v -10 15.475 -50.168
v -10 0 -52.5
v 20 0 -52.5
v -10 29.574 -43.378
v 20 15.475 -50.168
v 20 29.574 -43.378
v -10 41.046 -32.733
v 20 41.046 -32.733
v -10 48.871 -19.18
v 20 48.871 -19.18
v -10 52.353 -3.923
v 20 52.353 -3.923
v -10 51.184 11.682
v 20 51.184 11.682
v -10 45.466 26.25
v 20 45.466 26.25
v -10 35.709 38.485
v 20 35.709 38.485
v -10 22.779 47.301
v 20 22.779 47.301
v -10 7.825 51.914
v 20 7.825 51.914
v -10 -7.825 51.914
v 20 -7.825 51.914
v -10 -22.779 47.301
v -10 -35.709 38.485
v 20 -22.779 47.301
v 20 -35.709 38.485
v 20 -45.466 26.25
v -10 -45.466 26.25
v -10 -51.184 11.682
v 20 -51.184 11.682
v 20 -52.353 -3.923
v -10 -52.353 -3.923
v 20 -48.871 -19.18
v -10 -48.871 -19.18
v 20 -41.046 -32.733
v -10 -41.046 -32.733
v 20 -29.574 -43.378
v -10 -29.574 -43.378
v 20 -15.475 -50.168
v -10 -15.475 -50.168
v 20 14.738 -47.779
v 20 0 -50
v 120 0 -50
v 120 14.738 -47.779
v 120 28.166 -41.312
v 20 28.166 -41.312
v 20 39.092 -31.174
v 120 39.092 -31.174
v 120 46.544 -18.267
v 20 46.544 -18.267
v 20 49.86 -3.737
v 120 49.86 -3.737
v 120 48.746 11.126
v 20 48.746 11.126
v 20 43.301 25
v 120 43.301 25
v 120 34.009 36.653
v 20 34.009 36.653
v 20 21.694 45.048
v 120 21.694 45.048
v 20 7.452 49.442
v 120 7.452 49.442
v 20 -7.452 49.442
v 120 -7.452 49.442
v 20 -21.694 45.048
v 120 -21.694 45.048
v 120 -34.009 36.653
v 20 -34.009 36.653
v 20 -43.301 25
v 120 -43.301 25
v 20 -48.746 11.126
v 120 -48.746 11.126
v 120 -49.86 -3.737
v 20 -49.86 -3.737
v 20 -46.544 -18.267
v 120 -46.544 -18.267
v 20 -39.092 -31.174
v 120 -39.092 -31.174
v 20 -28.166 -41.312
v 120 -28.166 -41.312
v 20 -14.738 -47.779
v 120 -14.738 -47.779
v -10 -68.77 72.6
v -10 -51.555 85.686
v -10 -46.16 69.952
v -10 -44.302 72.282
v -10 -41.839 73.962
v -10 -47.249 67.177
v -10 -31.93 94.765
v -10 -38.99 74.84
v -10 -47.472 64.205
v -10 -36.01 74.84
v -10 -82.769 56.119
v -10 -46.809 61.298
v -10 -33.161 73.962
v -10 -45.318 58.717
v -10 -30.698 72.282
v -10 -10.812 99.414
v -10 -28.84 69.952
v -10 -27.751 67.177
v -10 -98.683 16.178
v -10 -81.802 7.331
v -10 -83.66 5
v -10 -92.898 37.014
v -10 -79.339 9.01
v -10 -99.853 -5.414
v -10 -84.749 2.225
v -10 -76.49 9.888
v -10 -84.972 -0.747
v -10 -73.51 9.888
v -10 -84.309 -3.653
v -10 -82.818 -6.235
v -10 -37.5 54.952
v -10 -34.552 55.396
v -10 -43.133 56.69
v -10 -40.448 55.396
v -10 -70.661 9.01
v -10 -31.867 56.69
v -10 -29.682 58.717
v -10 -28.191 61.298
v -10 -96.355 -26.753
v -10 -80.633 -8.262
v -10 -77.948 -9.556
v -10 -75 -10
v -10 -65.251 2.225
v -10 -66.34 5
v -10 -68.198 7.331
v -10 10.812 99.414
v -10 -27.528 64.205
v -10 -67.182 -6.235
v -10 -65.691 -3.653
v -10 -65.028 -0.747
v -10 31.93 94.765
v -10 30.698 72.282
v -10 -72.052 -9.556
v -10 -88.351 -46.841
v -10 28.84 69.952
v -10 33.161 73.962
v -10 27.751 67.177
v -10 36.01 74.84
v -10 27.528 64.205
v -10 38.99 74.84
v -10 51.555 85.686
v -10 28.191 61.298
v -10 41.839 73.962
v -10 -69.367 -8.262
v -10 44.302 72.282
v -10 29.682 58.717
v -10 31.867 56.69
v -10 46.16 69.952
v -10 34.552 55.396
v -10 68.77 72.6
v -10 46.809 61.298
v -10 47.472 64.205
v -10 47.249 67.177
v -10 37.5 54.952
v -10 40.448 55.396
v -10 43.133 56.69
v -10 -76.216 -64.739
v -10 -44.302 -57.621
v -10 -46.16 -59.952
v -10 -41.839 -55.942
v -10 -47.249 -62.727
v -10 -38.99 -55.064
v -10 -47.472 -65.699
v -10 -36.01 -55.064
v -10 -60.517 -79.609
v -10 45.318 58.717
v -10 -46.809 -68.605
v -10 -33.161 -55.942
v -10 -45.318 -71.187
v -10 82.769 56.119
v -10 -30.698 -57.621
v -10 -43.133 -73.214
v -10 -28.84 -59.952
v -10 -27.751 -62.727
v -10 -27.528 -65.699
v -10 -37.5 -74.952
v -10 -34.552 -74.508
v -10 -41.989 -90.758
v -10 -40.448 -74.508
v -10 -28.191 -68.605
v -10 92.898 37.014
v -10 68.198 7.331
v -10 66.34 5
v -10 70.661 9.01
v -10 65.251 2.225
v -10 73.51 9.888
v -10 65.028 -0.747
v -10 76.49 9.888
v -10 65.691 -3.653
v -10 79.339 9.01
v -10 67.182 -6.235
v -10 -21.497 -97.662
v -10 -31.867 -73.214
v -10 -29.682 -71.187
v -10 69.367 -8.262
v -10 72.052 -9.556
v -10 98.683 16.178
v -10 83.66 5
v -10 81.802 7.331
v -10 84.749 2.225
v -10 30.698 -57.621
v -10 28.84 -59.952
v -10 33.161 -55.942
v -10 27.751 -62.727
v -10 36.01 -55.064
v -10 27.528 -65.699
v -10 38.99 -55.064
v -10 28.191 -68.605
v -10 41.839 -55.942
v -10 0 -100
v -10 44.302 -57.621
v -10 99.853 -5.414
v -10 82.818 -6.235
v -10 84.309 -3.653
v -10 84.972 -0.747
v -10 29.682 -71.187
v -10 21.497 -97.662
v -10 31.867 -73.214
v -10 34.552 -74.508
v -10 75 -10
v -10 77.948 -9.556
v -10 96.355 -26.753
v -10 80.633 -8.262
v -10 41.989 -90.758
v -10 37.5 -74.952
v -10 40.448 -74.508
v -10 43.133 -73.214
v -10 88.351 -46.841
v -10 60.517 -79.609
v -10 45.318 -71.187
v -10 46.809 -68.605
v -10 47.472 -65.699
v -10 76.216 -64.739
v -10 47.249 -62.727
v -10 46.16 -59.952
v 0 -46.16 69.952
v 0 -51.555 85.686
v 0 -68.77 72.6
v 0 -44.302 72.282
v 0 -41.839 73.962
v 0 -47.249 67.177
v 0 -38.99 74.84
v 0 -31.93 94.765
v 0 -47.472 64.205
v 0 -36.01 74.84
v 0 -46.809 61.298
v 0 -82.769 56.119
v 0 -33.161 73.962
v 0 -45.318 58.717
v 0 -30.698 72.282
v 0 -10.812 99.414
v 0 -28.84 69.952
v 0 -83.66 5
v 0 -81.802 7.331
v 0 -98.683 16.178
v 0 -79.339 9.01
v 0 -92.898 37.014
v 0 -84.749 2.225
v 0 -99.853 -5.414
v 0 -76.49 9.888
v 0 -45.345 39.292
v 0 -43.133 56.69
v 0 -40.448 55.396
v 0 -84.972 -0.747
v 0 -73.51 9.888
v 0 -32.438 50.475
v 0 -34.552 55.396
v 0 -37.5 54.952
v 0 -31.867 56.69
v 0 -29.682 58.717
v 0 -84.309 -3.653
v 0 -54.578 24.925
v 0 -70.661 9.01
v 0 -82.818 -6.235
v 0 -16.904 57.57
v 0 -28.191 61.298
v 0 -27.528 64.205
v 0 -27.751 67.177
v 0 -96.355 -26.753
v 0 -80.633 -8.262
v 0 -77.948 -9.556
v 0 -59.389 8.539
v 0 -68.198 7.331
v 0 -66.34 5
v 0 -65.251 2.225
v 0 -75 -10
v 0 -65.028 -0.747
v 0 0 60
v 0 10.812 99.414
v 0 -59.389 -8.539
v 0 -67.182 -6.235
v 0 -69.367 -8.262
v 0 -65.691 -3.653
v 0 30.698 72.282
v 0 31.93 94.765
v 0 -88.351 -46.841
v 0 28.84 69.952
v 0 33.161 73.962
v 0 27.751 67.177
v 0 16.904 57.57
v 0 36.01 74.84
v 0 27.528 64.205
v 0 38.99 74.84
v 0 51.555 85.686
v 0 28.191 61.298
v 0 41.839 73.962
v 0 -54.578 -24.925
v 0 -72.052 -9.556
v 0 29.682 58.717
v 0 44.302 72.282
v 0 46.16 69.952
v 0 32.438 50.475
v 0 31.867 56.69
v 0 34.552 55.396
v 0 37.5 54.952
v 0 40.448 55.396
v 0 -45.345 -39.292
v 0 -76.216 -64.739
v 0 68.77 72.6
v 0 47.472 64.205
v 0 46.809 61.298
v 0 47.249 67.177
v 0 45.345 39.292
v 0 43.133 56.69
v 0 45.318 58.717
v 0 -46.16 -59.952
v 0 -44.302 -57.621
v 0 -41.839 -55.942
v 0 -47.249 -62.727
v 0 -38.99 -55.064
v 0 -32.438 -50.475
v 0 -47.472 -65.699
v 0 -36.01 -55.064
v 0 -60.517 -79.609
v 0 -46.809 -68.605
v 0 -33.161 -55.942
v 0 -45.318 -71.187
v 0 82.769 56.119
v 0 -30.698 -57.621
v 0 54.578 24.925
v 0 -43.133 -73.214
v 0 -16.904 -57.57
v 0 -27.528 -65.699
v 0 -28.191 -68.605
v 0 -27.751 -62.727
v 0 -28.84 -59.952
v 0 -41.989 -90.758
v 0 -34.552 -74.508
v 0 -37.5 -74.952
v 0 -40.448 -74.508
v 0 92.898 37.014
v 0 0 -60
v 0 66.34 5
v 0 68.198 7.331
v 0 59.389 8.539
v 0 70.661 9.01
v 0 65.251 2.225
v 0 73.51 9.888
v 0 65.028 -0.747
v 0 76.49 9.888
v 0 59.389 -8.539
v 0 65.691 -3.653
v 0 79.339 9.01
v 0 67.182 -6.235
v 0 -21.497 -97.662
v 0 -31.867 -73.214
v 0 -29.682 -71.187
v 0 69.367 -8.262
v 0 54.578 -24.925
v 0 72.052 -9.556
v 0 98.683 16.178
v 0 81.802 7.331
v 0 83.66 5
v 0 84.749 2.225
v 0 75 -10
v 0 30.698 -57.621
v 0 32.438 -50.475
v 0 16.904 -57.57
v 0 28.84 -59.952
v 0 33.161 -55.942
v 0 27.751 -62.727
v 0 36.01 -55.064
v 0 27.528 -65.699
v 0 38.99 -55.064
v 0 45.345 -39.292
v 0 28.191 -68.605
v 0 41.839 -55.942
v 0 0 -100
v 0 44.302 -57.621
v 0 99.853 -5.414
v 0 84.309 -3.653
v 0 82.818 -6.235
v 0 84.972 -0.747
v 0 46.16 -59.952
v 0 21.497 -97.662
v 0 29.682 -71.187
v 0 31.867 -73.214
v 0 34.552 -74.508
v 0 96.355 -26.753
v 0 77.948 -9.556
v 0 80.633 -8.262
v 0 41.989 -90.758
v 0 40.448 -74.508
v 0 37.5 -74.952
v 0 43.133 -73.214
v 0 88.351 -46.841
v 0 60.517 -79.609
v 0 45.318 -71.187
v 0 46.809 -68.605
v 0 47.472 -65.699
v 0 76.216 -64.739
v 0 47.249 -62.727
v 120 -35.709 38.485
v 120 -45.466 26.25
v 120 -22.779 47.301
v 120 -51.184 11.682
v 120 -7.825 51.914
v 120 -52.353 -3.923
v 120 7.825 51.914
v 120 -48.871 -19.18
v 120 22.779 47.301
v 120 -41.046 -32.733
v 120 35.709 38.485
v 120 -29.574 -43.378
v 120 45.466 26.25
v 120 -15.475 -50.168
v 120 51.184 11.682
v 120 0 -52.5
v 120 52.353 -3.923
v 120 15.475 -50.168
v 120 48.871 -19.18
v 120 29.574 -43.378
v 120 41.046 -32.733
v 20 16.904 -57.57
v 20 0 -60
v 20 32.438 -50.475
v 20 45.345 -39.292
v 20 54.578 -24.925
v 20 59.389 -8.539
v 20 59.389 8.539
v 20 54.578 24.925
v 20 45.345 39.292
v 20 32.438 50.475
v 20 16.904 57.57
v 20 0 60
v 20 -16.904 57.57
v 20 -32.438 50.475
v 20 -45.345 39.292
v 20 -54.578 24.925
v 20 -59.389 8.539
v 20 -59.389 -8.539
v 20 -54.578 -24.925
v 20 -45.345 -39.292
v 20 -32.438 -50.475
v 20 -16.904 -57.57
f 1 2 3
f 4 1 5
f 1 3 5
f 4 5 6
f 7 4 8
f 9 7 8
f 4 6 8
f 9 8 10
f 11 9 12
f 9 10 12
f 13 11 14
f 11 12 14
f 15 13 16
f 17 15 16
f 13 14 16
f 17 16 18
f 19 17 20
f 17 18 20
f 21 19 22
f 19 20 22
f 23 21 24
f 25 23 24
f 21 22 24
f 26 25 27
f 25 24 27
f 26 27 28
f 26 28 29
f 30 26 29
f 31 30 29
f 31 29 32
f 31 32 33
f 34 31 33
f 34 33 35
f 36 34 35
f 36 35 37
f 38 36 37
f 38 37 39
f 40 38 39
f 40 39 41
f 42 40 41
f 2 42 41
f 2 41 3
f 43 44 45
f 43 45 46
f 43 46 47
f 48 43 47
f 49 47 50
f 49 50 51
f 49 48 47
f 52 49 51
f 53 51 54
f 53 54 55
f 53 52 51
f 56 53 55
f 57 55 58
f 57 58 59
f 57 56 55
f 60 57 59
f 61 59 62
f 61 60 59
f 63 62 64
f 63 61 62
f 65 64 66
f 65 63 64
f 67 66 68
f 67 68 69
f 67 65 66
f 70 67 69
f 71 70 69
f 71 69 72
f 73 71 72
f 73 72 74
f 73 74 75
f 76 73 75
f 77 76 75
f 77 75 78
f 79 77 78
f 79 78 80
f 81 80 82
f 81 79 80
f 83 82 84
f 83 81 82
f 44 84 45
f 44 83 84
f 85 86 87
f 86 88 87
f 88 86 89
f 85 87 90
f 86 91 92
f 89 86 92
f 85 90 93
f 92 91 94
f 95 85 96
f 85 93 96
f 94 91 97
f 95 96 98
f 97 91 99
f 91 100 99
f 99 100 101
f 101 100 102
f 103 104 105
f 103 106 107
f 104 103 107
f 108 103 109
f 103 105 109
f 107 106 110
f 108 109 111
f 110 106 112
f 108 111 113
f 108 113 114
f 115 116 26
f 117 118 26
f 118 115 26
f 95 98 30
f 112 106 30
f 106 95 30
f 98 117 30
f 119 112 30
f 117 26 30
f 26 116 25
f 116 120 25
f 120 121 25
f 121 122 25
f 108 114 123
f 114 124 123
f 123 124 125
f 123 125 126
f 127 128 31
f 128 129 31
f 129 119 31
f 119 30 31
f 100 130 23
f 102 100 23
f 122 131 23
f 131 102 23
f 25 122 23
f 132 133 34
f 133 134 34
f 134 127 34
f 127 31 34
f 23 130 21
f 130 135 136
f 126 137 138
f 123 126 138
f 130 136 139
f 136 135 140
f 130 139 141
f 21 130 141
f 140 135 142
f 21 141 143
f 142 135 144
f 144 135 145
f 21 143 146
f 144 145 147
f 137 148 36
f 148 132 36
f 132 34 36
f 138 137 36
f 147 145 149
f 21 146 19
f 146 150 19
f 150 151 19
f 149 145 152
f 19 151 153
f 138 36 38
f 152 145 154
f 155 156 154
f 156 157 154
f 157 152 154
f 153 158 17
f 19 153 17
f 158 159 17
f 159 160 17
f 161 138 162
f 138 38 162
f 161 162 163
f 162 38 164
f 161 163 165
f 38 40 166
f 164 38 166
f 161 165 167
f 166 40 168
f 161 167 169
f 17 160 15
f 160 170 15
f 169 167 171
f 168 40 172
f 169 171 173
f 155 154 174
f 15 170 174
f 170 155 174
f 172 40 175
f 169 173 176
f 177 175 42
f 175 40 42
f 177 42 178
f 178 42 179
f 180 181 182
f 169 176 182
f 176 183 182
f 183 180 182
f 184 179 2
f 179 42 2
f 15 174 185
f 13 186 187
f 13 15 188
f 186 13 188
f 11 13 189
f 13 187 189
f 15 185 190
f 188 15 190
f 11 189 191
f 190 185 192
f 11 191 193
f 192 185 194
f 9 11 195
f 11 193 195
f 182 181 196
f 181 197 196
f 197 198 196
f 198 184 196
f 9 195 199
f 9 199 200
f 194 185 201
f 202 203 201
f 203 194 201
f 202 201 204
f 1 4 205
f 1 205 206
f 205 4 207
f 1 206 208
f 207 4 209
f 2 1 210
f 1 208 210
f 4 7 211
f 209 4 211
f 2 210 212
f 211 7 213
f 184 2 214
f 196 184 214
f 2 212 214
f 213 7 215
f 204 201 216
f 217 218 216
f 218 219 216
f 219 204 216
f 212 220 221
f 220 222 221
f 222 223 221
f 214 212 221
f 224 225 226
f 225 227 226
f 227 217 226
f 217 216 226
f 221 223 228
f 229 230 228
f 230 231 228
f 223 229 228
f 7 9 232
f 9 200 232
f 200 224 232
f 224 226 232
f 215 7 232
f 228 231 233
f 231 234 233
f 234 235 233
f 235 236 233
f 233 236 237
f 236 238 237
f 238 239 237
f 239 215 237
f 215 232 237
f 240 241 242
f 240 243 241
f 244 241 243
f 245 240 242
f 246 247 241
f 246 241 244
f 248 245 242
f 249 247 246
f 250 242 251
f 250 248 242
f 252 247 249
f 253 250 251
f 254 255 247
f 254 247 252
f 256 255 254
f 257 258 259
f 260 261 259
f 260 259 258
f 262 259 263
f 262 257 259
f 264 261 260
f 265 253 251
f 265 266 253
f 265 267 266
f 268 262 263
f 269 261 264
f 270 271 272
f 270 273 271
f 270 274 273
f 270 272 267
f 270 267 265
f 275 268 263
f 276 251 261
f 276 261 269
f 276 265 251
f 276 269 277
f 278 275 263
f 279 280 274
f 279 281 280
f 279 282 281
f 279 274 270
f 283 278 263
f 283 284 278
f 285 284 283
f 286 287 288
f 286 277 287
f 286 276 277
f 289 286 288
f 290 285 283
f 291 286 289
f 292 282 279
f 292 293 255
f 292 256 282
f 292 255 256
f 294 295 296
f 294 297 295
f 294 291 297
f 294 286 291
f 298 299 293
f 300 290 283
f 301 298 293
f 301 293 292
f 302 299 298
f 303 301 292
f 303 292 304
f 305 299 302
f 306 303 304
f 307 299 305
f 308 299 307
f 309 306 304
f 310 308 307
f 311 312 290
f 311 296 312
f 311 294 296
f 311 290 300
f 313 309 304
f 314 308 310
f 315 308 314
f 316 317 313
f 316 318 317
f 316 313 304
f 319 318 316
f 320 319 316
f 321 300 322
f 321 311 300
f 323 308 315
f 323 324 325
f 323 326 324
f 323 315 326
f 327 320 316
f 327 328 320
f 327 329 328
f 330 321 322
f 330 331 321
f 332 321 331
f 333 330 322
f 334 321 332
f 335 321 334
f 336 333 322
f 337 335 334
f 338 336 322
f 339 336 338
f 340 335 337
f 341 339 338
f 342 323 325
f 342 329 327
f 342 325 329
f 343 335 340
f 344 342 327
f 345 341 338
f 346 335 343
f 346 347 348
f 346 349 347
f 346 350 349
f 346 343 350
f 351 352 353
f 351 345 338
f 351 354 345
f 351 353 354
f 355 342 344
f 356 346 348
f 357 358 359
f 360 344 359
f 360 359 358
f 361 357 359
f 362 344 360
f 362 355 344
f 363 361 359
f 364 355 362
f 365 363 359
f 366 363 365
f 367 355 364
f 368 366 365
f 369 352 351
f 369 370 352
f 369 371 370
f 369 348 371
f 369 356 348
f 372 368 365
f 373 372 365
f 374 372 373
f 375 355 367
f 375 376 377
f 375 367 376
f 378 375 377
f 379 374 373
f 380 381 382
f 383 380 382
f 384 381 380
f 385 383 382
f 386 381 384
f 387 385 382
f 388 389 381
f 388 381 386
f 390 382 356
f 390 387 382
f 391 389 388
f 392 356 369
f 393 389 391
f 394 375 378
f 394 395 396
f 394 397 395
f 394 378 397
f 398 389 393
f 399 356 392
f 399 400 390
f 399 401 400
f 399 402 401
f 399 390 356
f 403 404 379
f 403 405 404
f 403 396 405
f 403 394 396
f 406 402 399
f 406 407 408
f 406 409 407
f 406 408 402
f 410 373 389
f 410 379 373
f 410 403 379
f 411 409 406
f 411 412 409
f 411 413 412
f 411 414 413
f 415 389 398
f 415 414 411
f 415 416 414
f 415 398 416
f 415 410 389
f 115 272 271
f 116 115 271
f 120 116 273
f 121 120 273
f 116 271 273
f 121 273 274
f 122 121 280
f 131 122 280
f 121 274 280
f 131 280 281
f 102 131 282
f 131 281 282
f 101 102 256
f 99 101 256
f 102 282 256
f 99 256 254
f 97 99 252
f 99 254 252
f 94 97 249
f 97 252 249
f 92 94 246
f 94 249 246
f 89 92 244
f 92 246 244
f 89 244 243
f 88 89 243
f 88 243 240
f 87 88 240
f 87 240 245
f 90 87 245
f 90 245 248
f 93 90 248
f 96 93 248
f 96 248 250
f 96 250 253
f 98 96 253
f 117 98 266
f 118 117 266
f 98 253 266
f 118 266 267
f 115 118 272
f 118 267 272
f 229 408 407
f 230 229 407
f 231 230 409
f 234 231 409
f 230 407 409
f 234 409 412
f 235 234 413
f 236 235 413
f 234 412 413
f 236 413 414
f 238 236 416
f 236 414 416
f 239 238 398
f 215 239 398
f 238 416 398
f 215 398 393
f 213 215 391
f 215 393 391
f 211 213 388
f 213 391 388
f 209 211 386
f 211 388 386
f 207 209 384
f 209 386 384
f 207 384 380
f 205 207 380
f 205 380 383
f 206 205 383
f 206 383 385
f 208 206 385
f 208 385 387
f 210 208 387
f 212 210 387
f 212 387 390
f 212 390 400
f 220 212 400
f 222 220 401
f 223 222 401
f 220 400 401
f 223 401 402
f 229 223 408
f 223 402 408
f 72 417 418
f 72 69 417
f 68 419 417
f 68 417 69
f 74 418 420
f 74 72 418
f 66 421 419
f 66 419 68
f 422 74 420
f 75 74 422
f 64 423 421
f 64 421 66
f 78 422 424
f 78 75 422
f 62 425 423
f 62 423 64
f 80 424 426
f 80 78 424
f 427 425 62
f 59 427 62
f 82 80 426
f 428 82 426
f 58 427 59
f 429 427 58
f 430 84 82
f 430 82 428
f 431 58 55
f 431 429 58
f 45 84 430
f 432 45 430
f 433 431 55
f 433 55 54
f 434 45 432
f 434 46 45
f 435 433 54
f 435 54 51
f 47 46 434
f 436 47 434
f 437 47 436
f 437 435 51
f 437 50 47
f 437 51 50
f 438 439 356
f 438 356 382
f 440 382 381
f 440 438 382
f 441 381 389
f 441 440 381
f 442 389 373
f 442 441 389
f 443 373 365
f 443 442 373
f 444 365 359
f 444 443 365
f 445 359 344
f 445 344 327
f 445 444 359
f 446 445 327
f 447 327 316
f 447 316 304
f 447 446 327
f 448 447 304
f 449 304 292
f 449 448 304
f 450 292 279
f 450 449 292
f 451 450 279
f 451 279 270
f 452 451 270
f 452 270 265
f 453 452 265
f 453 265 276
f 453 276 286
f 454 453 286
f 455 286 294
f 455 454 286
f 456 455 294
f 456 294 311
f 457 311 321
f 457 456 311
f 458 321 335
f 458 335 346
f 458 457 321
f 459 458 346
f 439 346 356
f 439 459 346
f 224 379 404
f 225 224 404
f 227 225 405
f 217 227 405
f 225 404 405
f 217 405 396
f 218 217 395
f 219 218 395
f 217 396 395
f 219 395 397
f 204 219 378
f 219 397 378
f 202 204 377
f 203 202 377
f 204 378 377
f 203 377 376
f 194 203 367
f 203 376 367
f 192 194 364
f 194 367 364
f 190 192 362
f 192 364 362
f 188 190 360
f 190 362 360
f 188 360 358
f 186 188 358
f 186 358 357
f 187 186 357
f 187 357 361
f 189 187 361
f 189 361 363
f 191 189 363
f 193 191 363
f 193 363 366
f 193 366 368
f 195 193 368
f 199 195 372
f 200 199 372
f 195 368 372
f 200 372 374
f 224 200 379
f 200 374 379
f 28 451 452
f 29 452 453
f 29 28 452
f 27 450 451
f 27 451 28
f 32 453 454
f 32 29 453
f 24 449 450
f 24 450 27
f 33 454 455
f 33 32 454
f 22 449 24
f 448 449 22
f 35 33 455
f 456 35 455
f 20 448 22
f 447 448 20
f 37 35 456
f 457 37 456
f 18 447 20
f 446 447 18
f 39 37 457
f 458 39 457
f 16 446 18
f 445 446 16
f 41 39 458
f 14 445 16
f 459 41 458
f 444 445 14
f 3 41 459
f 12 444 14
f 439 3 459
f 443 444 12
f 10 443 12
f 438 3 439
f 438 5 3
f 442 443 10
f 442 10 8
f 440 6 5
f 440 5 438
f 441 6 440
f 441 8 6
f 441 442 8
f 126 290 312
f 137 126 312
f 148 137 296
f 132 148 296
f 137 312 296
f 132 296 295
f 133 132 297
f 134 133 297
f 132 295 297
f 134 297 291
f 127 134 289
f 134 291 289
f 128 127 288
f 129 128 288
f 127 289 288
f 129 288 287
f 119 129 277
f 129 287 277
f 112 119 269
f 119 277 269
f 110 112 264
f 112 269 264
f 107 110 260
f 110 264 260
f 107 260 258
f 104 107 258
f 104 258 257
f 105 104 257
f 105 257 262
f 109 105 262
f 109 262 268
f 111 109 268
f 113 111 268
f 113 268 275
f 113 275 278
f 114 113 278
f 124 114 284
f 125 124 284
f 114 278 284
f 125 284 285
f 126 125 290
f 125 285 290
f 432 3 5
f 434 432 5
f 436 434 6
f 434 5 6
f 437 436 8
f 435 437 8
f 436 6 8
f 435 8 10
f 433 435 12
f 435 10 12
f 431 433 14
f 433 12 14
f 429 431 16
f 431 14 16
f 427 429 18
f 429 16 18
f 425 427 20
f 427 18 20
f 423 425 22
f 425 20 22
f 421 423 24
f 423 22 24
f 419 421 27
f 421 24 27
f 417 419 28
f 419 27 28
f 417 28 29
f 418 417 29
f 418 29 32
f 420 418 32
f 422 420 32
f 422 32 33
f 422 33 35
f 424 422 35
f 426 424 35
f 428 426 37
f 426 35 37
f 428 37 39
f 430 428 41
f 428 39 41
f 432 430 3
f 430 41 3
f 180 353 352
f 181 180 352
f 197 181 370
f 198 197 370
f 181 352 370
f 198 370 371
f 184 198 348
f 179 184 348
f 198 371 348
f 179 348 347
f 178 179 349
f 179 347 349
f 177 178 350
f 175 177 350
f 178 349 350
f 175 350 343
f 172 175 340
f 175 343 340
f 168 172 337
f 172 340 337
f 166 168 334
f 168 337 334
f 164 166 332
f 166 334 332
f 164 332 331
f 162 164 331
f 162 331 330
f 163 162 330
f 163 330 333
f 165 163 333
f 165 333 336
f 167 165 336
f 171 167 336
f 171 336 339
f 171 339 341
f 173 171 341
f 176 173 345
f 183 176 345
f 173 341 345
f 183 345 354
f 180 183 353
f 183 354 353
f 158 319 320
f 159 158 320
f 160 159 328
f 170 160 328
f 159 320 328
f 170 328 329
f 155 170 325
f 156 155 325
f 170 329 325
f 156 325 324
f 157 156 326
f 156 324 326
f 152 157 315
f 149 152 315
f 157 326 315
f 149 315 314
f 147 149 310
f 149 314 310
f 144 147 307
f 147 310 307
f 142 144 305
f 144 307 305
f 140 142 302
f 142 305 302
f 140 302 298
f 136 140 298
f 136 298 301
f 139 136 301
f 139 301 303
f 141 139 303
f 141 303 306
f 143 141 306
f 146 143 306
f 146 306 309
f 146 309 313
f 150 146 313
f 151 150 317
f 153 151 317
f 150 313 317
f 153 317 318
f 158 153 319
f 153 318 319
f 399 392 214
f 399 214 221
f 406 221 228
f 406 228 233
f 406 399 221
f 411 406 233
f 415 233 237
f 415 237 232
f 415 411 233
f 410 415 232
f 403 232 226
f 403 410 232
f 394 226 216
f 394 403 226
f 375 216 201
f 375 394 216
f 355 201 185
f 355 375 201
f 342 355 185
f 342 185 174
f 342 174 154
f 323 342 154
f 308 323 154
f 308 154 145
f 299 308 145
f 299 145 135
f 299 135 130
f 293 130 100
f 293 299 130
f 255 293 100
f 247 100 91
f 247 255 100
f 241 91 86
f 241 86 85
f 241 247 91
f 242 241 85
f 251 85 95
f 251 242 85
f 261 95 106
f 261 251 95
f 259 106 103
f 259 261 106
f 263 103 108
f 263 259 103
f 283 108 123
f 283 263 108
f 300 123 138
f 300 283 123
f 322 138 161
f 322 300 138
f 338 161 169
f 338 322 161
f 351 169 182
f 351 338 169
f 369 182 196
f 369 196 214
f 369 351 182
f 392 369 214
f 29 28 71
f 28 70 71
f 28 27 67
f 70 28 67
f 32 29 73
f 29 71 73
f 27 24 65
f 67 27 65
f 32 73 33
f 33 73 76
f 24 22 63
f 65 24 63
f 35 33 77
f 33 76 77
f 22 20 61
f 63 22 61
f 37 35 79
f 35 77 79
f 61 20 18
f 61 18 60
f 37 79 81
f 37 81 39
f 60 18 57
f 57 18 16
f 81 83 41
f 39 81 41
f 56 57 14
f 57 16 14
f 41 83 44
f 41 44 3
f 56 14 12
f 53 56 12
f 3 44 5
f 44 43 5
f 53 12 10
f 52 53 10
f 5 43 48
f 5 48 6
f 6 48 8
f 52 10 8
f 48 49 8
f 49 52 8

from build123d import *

# Parameters (mm, degrees)
SKETCH1_R           = 100
SKETCH1_R_2         = 52.5
SKETCH1_R_3         = 10
BOSS_EXTRUDE1_DEPTH = 10
BOSS_EXTRUDE2_START = 20
SKETCH2_R           = 60
SKETCH2_R_2         = 52.5
BOSS_EXTRUDE2_DEPTH = 20
SKETCH3_R           = 52.5
SKETCH3_R_2         = 50
BOSS_EXTRUDE3_DEPTH = 100


with BuildPart() as part:
    # Sketch1 → Boss-Extrude1 (new body)
    with BuildSketch(Plane(origin=(0, 0, 0), x_dir=(0, 0, -1), z_dir=(1, 0, 0))):
        Circle(SKETCH1_R)
        Circle(SKETCH1_R_2, mode=Mode.SUBTRACT)
        with Locations((0, 75)):
            Circle(SKETCH1_R_3, mode=Mode.SUBTRACT)
        with Locations((64.951905284, 37.5)):
            Circle(SKETCH1_R_3, mode=Mode.SUBTRACT)
        with Locations((64.951905284, -37.5)):
            Circle(SKETCH1_R_3, mode=Mode.SUBTRACT)
        with Locations((0, -75)):
            Circle(SKETCH1_R_3, mode=Mode.SUBTRACT)
        with Locations((-64.951905284, -37.5)):
            Circle(SKETCH1_R_3, mode=Mode.SUBTRACT)
        with Locations((-64.951905284, 37.5)):
            Circle(SKETCH1_R_3, mode=Mode.SUBTRACT)
    extrude(amount=-BOSS_EXTRUDE1_DEPTH)

    # Sketch2 → Boss-Extrude2 (add)
    with BuildSketch(Plane(origin=(0, 0, 0), x_dir=(0, 0, -1), z_dir=(1, 0, 0)).offset(BOSS_EXTRUDE2_START)):
        Circle(SKETCH2_R)
        Circle(SKETCH2_R_2, mode=Mode.SUBTRACT)
    extrude(amount=-BOSS_EXTRUDE2_DEPTH)


with BuildPart() as body_2:
    # Sketch3 → Boss-Extrude3 (new body)
    with BuildSketch(Plane(origin=(20, 0, 0), x_dir=(0, 0, -1), z_dir=(1, 0, 0))):
        Circle(SKETCH3_R)
        Circle(SKETCH3_R_2, mode=Mode.SUBTRACT)
    extrude(amount=BOSS_EXTRUDE3_DEPTH)


solid = Compound([part.part, body_2.part])
